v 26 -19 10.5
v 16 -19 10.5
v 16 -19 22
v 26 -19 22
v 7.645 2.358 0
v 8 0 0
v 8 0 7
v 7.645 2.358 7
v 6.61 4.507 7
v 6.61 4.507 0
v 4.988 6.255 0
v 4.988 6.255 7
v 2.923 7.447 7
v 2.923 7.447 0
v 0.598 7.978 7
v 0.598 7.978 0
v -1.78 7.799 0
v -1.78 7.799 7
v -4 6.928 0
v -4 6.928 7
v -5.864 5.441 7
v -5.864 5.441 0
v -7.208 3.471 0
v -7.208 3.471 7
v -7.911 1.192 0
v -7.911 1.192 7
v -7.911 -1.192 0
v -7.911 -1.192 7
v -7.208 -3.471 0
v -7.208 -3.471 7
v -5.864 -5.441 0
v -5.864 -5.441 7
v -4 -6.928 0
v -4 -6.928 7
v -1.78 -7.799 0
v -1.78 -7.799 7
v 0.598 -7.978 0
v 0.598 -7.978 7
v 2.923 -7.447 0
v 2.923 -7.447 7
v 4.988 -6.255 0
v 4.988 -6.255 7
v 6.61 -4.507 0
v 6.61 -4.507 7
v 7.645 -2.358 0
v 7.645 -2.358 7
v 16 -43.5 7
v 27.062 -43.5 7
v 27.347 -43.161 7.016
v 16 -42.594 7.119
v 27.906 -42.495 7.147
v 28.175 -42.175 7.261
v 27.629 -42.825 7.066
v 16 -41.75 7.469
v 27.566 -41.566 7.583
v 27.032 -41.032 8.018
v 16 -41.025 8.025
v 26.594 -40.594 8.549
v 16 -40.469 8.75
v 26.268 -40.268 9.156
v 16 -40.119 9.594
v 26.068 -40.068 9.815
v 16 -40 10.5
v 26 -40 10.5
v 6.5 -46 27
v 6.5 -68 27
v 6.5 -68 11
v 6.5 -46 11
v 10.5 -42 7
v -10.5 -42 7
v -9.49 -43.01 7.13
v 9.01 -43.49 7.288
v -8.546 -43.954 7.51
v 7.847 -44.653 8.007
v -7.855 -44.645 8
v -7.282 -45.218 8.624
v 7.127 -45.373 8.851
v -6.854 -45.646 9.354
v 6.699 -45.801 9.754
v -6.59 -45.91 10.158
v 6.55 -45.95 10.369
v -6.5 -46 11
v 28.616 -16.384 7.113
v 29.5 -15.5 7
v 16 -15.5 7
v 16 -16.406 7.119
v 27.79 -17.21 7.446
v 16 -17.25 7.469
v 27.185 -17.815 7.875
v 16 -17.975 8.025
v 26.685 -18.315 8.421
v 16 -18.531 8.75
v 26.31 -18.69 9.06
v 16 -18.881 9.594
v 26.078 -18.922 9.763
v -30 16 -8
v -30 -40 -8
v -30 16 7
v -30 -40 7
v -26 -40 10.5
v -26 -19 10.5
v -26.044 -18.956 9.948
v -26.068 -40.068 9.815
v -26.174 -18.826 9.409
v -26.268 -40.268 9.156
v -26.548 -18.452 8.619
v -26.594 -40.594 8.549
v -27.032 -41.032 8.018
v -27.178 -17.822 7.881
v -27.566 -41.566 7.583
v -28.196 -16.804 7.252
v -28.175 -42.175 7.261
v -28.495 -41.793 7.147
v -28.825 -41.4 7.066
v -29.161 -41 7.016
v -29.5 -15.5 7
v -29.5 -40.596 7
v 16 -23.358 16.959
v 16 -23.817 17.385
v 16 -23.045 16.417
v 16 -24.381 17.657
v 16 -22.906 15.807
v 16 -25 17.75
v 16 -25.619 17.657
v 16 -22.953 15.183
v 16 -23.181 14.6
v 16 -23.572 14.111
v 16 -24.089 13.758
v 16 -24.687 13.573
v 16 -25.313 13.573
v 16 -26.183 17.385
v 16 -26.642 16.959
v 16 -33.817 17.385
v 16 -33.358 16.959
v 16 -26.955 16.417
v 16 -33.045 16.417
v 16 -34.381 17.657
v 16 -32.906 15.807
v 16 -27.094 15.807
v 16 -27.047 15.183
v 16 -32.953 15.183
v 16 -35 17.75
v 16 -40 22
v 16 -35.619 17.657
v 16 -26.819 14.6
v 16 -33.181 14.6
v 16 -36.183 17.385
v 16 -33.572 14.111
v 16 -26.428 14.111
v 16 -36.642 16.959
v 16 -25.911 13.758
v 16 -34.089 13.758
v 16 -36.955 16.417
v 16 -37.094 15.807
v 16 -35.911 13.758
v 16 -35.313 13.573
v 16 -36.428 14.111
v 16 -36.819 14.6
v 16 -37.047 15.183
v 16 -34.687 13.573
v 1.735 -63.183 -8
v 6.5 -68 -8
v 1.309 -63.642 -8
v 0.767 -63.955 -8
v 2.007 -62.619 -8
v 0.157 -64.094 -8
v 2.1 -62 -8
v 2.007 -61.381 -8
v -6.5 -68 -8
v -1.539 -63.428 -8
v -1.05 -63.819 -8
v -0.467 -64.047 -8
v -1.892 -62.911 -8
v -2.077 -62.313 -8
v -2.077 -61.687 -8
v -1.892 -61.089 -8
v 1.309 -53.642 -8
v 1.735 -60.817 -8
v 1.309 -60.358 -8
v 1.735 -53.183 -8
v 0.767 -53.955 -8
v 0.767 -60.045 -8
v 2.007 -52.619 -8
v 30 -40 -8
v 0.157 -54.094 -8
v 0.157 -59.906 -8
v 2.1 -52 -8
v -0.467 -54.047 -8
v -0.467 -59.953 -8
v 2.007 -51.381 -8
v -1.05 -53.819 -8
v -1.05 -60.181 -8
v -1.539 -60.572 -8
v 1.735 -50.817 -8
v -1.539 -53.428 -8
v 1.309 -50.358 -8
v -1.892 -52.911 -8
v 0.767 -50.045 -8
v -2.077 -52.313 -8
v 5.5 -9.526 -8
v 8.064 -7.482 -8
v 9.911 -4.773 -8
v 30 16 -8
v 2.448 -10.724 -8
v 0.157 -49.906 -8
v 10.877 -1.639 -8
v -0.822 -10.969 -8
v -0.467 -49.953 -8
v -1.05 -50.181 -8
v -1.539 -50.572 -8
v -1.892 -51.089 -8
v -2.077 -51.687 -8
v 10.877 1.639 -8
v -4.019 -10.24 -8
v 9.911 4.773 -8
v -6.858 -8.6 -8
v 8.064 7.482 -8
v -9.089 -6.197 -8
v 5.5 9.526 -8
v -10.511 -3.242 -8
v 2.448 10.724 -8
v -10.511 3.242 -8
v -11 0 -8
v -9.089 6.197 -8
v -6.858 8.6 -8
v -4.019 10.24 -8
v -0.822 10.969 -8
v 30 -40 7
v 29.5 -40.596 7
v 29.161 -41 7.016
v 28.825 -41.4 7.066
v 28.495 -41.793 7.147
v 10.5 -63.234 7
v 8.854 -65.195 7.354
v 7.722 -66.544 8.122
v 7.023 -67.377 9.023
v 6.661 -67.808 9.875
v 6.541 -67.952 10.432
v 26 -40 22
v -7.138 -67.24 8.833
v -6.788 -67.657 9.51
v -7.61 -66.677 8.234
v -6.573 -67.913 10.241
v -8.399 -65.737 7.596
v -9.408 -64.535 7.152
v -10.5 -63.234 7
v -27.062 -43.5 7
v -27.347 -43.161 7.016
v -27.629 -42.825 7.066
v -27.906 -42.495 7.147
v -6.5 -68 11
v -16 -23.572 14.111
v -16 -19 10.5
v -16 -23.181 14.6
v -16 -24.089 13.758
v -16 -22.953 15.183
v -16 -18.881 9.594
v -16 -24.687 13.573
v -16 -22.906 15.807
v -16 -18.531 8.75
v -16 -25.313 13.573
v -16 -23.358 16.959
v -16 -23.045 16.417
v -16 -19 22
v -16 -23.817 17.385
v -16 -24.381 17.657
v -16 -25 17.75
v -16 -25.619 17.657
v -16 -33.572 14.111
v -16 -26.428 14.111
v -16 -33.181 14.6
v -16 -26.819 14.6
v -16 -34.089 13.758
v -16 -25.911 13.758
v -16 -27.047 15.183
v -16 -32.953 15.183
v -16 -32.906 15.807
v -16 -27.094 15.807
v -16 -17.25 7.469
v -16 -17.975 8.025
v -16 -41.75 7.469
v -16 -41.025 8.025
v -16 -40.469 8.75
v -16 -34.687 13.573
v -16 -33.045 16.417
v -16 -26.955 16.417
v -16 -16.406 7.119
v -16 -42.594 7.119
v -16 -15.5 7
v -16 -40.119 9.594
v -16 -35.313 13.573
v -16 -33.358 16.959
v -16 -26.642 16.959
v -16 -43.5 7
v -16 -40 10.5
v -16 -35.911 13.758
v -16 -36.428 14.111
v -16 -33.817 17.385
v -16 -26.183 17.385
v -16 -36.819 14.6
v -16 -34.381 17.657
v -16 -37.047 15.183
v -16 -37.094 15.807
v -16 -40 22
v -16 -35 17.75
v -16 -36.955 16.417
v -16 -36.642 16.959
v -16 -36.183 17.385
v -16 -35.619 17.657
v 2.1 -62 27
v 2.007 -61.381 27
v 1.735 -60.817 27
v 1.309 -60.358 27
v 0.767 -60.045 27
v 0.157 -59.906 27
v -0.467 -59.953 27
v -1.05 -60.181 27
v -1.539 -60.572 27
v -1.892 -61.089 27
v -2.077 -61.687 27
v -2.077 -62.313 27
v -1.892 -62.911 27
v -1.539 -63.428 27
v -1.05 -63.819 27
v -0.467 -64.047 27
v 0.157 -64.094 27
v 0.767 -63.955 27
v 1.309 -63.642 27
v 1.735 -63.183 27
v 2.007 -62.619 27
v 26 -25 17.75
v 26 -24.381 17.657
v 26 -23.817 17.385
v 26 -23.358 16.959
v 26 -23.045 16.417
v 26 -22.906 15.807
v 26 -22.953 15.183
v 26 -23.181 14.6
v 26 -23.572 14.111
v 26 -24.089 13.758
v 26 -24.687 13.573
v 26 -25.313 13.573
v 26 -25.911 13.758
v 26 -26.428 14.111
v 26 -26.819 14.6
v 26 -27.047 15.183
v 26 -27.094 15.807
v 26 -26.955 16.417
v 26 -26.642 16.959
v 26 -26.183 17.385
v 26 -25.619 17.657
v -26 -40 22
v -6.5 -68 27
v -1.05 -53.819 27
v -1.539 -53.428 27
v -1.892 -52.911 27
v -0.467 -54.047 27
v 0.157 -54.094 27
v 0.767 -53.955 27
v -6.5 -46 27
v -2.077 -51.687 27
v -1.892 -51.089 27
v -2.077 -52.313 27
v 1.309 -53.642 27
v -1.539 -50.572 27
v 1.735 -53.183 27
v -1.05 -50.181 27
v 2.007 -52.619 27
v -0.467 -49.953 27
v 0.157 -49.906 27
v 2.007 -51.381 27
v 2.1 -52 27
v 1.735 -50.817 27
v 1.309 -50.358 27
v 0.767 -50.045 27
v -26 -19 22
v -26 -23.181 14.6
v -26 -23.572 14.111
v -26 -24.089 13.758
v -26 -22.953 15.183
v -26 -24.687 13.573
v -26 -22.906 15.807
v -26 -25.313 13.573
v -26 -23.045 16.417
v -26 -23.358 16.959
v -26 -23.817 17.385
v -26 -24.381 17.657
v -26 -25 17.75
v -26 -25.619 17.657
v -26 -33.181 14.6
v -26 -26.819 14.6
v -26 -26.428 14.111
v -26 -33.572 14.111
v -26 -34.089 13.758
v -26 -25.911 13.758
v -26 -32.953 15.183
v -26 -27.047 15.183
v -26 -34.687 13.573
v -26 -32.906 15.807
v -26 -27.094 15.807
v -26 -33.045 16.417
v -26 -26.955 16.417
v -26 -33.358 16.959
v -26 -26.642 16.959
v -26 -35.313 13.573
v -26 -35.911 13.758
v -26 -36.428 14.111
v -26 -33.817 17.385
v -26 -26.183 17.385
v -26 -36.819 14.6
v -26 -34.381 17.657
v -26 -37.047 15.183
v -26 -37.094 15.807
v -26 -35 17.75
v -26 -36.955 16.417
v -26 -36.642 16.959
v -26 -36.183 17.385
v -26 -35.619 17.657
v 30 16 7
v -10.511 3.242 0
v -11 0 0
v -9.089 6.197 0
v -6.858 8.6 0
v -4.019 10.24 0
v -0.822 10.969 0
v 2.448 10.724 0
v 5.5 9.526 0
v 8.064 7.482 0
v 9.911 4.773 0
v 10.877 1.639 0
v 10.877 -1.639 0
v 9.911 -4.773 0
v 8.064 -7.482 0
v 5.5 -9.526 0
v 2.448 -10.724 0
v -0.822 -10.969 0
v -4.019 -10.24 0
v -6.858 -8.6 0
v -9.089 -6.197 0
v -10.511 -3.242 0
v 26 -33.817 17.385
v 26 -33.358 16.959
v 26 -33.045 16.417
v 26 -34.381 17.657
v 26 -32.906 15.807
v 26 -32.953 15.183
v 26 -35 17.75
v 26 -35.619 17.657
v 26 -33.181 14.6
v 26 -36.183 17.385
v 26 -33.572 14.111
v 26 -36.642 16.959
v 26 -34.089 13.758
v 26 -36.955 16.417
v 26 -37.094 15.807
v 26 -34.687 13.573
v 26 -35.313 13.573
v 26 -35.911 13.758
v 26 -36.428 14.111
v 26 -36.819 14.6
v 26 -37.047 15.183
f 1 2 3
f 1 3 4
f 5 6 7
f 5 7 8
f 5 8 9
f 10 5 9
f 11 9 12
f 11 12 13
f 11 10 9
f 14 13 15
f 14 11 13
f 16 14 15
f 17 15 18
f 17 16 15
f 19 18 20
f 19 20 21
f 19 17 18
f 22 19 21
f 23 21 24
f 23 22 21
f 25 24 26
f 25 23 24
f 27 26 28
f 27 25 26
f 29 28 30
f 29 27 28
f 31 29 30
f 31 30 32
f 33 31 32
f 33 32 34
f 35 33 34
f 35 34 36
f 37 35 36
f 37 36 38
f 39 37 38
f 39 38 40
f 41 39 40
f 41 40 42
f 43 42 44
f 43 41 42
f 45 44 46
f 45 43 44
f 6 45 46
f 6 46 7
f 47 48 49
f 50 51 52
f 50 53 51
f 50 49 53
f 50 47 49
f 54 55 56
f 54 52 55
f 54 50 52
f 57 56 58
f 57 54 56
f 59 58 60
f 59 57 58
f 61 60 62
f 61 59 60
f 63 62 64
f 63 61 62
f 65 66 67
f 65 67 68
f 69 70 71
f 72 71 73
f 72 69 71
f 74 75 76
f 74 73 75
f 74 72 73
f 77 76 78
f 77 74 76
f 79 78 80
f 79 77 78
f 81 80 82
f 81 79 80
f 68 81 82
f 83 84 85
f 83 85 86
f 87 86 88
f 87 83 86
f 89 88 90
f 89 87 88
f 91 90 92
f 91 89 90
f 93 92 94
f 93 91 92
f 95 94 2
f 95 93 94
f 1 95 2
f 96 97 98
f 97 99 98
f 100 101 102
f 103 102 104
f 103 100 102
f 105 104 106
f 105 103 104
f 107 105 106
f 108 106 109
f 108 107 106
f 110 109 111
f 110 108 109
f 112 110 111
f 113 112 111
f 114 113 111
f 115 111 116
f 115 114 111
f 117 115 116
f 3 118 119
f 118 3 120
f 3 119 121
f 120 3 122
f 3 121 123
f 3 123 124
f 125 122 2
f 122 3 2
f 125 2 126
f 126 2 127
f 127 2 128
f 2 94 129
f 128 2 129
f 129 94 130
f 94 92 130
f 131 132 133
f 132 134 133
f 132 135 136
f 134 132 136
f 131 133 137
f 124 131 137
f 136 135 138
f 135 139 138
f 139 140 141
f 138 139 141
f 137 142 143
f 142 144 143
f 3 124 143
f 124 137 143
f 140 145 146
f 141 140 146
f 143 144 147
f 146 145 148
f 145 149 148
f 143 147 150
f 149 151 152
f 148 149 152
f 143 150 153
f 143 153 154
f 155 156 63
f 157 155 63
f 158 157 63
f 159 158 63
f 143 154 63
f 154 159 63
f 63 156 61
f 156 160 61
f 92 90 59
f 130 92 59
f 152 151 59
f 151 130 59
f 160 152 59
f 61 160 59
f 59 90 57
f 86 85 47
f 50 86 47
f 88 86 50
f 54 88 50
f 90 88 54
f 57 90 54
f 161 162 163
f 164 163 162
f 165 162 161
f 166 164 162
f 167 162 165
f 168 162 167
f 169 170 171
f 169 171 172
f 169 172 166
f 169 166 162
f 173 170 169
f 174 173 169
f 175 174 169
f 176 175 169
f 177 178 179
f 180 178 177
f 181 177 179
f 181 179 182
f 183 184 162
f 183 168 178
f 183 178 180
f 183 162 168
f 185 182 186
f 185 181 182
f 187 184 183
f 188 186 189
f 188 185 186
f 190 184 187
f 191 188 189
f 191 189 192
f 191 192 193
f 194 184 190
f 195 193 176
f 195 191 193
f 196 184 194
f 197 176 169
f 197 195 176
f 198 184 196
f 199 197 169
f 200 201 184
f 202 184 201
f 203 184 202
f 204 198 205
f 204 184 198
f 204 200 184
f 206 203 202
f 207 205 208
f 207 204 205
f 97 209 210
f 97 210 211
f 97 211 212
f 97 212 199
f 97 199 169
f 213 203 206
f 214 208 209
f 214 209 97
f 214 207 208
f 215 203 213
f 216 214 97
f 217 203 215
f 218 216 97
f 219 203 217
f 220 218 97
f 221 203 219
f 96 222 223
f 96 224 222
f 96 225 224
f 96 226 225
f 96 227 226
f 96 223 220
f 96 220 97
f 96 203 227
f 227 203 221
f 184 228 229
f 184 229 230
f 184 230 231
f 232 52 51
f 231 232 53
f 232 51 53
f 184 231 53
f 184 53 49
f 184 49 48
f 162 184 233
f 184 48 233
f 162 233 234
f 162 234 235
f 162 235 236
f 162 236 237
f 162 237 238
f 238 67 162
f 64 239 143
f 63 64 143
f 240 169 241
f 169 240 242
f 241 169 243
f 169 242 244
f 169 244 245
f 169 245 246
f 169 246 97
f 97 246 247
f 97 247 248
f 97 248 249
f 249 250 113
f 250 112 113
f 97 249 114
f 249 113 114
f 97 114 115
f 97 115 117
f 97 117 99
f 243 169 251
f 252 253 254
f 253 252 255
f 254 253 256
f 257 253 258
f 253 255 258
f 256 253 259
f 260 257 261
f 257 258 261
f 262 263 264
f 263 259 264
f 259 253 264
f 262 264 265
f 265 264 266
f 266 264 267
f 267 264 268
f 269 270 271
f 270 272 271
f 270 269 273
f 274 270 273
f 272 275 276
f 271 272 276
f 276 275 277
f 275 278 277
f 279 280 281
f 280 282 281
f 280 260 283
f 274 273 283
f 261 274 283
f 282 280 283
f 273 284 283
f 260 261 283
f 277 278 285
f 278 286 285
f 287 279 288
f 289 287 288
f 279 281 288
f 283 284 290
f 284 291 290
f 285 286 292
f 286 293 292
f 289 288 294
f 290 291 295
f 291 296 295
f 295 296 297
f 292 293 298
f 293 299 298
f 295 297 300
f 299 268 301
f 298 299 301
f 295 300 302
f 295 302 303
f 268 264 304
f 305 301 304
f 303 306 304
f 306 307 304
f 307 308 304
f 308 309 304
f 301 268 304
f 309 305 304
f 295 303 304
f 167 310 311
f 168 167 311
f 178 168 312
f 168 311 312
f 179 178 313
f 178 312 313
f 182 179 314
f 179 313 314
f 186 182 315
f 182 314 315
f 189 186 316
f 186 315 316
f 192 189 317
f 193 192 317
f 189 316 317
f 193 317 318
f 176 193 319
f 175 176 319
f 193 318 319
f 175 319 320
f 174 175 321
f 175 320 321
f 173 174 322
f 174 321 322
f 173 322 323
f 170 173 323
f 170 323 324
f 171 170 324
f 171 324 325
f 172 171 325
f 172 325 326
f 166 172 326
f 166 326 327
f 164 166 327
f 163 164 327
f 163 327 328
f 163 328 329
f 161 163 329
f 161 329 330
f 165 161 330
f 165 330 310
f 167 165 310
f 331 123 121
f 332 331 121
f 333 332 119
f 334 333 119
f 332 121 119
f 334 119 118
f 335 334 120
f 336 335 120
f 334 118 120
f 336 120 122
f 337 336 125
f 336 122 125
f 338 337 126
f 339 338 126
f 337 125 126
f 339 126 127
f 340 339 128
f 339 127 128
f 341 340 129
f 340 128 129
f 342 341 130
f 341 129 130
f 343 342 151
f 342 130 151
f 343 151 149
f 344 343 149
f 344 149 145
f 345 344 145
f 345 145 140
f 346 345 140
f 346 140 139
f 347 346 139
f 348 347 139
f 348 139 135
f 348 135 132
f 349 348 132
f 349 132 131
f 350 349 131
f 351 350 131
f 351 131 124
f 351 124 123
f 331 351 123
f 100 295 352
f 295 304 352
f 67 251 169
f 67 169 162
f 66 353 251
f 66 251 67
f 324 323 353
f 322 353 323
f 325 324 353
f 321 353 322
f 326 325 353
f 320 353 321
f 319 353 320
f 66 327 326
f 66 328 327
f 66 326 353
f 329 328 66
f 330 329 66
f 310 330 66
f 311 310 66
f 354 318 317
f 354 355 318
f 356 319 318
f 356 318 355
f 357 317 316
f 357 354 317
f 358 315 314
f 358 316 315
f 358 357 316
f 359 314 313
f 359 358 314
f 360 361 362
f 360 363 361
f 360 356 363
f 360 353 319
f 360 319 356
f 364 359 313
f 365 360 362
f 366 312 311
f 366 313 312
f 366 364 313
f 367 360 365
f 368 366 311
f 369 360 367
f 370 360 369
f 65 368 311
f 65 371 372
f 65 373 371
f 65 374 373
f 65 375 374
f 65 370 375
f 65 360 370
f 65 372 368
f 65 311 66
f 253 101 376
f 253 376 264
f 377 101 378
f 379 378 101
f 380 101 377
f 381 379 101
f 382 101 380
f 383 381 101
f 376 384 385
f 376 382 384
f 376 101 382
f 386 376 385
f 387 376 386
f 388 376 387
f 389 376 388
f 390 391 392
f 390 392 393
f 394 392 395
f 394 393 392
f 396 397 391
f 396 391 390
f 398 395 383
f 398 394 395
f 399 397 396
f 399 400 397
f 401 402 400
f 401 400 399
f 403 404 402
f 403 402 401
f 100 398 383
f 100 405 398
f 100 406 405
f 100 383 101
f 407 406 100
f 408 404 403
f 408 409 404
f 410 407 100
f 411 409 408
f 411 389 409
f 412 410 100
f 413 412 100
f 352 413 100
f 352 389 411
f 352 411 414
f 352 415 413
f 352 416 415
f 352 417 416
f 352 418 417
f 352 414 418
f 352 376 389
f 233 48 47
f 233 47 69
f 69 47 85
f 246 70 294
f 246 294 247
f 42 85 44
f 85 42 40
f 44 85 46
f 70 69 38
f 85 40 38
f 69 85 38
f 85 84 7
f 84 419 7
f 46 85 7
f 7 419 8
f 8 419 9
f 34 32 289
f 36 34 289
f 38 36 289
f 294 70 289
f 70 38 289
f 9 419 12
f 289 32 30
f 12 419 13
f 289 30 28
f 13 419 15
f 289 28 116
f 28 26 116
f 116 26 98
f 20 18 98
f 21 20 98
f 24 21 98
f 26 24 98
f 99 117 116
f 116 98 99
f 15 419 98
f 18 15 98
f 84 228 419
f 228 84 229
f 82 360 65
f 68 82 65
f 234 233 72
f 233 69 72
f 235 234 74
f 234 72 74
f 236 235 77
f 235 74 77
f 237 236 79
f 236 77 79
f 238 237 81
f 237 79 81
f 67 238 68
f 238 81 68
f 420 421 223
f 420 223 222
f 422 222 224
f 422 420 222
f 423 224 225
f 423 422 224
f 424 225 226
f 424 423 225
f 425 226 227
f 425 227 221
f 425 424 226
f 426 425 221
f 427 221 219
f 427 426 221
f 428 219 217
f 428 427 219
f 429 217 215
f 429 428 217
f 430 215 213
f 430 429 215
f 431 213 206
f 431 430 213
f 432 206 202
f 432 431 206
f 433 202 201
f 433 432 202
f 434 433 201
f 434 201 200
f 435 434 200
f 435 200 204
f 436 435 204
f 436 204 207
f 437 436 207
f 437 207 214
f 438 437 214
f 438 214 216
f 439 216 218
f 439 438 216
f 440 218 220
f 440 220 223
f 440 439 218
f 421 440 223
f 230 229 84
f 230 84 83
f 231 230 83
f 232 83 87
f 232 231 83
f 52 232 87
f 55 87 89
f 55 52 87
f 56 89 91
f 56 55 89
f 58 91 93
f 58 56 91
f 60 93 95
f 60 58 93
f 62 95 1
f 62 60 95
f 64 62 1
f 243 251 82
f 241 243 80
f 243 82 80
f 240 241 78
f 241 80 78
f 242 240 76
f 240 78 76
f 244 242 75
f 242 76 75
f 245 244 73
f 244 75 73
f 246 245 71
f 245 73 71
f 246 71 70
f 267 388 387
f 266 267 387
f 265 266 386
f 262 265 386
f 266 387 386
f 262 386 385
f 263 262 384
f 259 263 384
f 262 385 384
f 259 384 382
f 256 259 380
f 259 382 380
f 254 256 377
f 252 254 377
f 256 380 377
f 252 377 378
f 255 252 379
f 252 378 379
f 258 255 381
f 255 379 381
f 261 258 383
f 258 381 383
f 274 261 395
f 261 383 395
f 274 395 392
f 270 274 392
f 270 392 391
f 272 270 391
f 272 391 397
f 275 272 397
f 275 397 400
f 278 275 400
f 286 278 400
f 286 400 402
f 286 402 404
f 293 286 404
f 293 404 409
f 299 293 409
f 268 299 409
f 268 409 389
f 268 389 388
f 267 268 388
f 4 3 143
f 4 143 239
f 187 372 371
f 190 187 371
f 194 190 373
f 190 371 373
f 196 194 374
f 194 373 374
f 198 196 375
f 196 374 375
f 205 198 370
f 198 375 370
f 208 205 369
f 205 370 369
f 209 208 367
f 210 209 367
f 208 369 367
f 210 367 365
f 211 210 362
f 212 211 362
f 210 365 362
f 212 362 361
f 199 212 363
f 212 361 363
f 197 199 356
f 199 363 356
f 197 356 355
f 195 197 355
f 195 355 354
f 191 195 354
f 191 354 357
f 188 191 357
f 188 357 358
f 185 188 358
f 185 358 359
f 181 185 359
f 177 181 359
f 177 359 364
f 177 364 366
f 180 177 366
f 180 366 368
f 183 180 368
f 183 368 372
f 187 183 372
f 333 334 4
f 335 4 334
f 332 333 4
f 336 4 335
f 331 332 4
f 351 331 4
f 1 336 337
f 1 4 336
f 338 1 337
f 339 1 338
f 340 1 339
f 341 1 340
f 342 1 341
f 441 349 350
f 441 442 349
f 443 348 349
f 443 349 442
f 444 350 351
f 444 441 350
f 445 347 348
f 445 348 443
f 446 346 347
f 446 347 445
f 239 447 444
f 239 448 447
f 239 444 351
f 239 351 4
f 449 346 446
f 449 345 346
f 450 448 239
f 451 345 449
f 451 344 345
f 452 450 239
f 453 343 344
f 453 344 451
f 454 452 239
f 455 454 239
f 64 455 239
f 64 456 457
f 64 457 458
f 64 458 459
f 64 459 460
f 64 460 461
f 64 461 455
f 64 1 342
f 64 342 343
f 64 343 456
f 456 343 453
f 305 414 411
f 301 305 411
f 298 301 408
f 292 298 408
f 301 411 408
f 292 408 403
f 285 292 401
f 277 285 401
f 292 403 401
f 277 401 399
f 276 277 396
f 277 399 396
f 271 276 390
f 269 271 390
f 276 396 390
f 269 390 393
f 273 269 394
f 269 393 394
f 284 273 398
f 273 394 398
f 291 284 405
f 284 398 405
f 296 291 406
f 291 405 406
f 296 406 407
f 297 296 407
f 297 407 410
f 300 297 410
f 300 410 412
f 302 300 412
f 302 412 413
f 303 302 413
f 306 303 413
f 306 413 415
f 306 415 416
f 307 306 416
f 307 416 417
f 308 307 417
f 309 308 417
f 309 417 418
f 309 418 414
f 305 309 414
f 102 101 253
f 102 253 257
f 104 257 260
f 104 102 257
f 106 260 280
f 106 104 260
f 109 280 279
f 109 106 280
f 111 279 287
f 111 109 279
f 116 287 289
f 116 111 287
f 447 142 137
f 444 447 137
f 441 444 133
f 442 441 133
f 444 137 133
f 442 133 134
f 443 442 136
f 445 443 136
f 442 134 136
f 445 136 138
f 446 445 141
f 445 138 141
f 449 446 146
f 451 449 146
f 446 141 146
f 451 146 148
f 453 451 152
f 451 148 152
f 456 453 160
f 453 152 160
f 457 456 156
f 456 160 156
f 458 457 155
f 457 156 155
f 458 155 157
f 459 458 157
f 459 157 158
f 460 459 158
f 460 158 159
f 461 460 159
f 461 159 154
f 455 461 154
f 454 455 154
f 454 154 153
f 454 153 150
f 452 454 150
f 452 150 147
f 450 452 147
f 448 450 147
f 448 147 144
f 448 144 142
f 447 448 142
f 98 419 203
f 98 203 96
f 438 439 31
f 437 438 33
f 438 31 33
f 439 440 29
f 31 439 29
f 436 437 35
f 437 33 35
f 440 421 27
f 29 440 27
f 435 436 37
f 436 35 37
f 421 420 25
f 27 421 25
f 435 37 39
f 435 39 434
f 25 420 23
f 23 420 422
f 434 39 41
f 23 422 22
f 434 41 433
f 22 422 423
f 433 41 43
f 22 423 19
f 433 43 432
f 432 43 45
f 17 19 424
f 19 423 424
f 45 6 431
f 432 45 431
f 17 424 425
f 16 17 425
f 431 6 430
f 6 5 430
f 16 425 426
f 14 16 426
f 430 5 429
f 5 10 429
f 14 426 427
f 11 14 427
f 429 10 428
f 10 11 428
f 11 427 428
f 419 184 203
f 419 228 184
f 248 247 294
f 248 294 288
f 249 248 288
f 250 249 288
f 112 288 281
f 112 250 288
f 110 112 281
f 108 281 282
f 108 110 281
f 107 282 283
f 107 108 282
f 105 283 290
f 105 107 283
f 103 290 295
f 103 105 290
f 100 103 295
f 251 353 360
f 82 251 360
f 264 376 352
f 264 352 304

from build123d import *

# Parameters (mm, degrees)
SKETCH1_W           = 60
SKETCH1_H           = 56
SKETCH1_R           = 8
BOSS_EXTRUDE1_DEPTH = 7
SKETCH2_W           = 60
SKETCH2_H           = 56
SKETCH2_R           = 11
BOSS_EXTRUDE2_DEPTH = 8
SKETCH3_W           = 10
SKETCH3_H           = 21
BOSS_EXTRUDE3_DEPTH = 15
SKETCH4_R           = 2.1
CUT_EXTRUDE1_DEPTH  = 73.249567473
SKETCH5_R           = 2.1
BOSS_EXTRUDE4_DEPTH = 15
FILLET2_R           = 3.5
BOSS_EXTRUDE5_START = 20
SKETCH7_W           = 13
SKETCH7_H           = 22
SKETCH7_R           = 2.1
BOSS_EXTRUDE5_DEPTH = 20
FILLET3_R           = 4


with BuildPart() as part:
    # Sketch1 → Boss-Extrude1 (new body)
    with BuildSketch(Plane.XY):
        with Locations((0, -12)):
            Rectangle(SKETCH1_W, SKETCH1_H)
        Circle(SKETCH1_R, mode=Mode.SUBTRACT)
    extrude(amount=BOSS_EXTRUDE1_DEPTH)

    # Sketch2 → Boss-Extrude2 (add)
    with BuildSketch(Plane(origin=(0, 0, 0), x_dir=(-1, 0, 0), z_dir=(0, 0, -1))):
        with Locations((0, -12)):
            Rectangle(SKETCH2_W, SKETCH2_H)
        Circle(SKETCH2_R, mode=Mode.SUBTRACT)
    extrude(amount=BOSS_EXTRUDE2_DEPTH)

    # Sketch3 → Boss-Extrude3 (add)
    with BuildSketch(Plane.XY.offset(7)):
        with Locations((-21, -29.5)):
            Rectangle(SKETCH3_W, SKETCH3_H)
        with Locations((21, -29.5)):
            Rectangle(SKETCH3_W, SKETCH3_H)
    extrude(amount=BOSS_EXTRUDE3_DEPTH)

    # Sketch4 → Cut-Extrude1 (cut, through all)
    with BuildSketch(Plane.ZY.offset(26)):
        with Locations((15.65, -25)):
            Circle(SKETCH4_R)
        with Locations((15.65, -35)):
            Circle(SKETCH4_R)
    extrude(amount=-CUT_EXTRUDE1_DEPTH, mode=Mode.SUBTRACT)

    # Sketch5 → Boss-Extrude4 (add, through all)
    with BuildSketch(Plane.XY.offset(7)):
        Polygon((-30, -40), (30, -40), (6.5, -68), (-6.5, -68), align=None)
        with Locations((0, -52)):
            Circle(SKETCH5_R, mode=Mode.SUBTRACT)
        with Locations((0, -62)):
            Circle(SKETCH5_R, mode=Mode.SUBTRACT)
    extrude(amount=-BOSS_EXTRUDE4_DEPTH)

    # Fillet2
    # the kernel refuses this fillet: 3.5 mm, written as the material it adds along each edge
    with BuildSketch(Plane(origin=(-26, -19, 7), x_dir=(0, 1, 0), z_dir=(1, 0, 0)), Plane(origin=(-26, -40, 7), x_dir=(0, 0, 1), z_dir=(1, 0, 0))) as fillet2_piece_1:
        with BuildLine():
            CenterArc((FILLET2_R, FILLET2_R), FILLET2_R, 180, 90)
            Line((0, FILLET2_R), (0, 0))
            Line((0, 0), (FILLET2_R, 0))
        make_face()
    extrude(amount=10)
    with BuildSketch(Plane(origin=(-26, -40, 7), x_dir=(-1, 0, 0), z_dir=(0, 1, 0))) as fillet2_piece_2:
        with BuildLine():
            CenterArc((FILLET2_R, FILLET2_R), FILLET2_R, 180, 90)
            Line((0, FILLET2_R), (0, 0))
            Line((0, 0), (FILLET2_R, 0))
        make_face()
    extrude(amount=21)
    with BuildSketch(Plane(origin=(26, -19, 7), x_dir=(0, 1, 0), z_dir=(-1, 0, 0)), Plane(origin=(16, -40, 7), x_dir=(0, -1, 0), z_dir=(1, 0, 0))) as fillet2_piece_3:
        with BuildLine():
            CenterArc((FILLET2_R, -FILLET2_R), FILLET2_R, 90, 90)
            Line((0, -FILLET2_R), (0, 0))
            Line((0, 0), (FILLET2_R, 0))
        make_face()
    extrude(amount=10)
    with BuildSketch(Plane(origin=(26, -40, 7), x_dir=(1, 0, 0), z_dir=(0, 1, 0))) as fillet2_piece_4:
        with BuildLine():
            CenterArc((FILLET2_R, -FILLET2_R), FILLET2_R, 90, 90)
            Line((0, -FILLET2_R), (0, 0))
            Line((0, 0), (FILLET2_R, 0))
        make_face()
    extrude(amount=21)
    with BuildSketch(Plane(origin=(-34.75, -19, 7), x_dir=(0, 1, 0), z_dir=(1, 0, 0))) as fillet2_piece_5a_section:
        with BuildLine():
            CenterArc((FILLET2_R, FILLET2_R), FILLET2_R, 180, 90)
            Line((0, FILLET2_R), (0, 0))
            Line((0, 0), (FILLET2_R, 0))
        make_face()
    fillet2_piece_5a = extrude(amount=18.75, mode=Mode.PRIVATE)
    fillet2_piece_5a = split(fillet2_piece_5a, bisect_by=Plane(origin=(-30, -18.2076171, 7.7923829), z_dir=(1, 0, 0)), keep=Keep.TOP, mode=Mode.PRIVATE)
    fillet2_piece_5a = split(fillet2_piece_5a, bisect_by=Plane(origin=(-26, -18.2076171, 7.7923829), z_dir=(-1, 0, 0)), keep=Keep.TOP, mode=Mode.PRIVATE)
    with BuildSketch(Plane(origin=(-26, -40, 7), x_dir=(-1, 0, 0), z_dir=(0, 1, 0))) as fillet2_piece_5b_section:
        with BuildLine():
            CenterArc((FILLET2_R, FILLET2_R), FILLET2_R, 180, 90)
            Line((0, FILLET2_R), (0, 0))
            Line((0, 0), (FILLET2_R, 0))
        make_face()
    fillet2_piece_5b = extrude(amount=29.75, mode=Mode.PRIVATE)
    fillet2_piece_5b = split(fillet2_piece_5b, bisect_by=Plane(origin=(-26.7923829, -19, 7.7923829), z_dir=(0, 1, 0)), keep=Keep.TOP, mode=Mode.PRIVATE)
    fillet2_piece_5 = fillet2_piece_5a & fillet2_piece_5b
    add(fillet2_piece_5)
    with BuildSketch(Plane(origin=(-34.75, -40, 7), x_dir=(0, 0, 1), z_dir=(1, 0, 0))) as fillet2_piece_6a_section:
        with BuildLine():
            CenterArc((FILLET2_R, FILLET2_R), FILLET2_R, 180, 90)
            Line((0, FILLET2_R), (0, 0))
            Line((0, 0), (FILLET2_R, 0))
        make_face()
    fillet2_piece_6a = extrude(amount=18.75, mode=Mode.PRIVATE)
    fillet2_piece_6a = split(fillet2_piece_6a, bisect_by=Plane(origin=(-26, -40.649592252, 7.87643738), z_dir=(-1, 0, 0)), keep=Keep.TOP, mode=Mode.PRIVATE)
    fillet2_piece_6a = split(fillet2_piece_6a, bisect_by=Plane(origin=(-28.740316489, -41.500899502, 7.87643738), z_dir=(0.765974253829985, 0.6428712487501661, 0)), keep=Keep.TOP, mode=Mode.PRIVATE)
    fillet2_piece_6a = split(fillet2_piece_6a, bisect_by=Plane(origin=(-30, -40.649592252, 7.87643738), z_dir=(1, 0, 0)), keep=Keep.TOP, mode=Mode.PRIVATE)
    with BuildSketch(Plane(origin=(-26, -48.75, 7), x_dir=(-1, 0, 0), z_dir=(0, 1, 0))) as fillet2_piece_6b_section:
        with BuildLine():
            CenterArc((FILLET2_R, FILLET2_R), FILLET2_R, 180, 90)
            Line((0, FILLET2_R), (0, 0))
            Line((0, 0), (FILLET2_R, 0))
        make_face()
    fillet2_piece_6b = extrude(amount=29.75, mode=Mode.PRIVATE)
    fillet2_piece_6b = split(fillet2_piece_6b, bisect_by=Plane(origin=(-26.614887028, -40, 7.897241021), z_dir=(0, -1, 0)), keep=Keep.TOP, mode=Mode.PRIVATE)
    fillet2_piece_6b = split(fillet2_piece_6b, bisect_by=Plane(origin=(-27.607937943, -42.850116494, 7.897241021), z_dir=(0.765974253829985, 0.6428712487501661, 0)), keep=Keep.TOP, mode=Mode.PRIVATE)
    fillet2_piece_6 = fillet2_piece_6a & fillet2_piece_6b
    add(fillet2_piece_6)
    with BuildSketch(Plane(origin=(26, -40, 7), x_dir=(1, 0, 0), z_dir=(0, 1, 0))) as fillet2_piece_7a_section:
        with BuildLine():
            CenterArc((FILLET2_R, -FILLET2_R), FILLET2_R, 90, 90)
            Line((0, -FILLET2_R), (0, 0))
            Line((0, 0), (FILLET2_R, 0))
        make_face()
    fillet2_piece_7a = extrude(amount=29.75, mode=Mode.PRIVATE)
    fillet2_piece_7a = split(fillet2_piece_7a, bisect_by=Plane(origin=(26.7923829, -19, 7.7923829), z_dir=(0, 1, 0)), keep=Keep.TOP, mode=Mode.PRIVATE)
    with BuildSketch(Plane(origin=(34.75, -19, 7), x_dir=(0, 1, 0), z_dir=(-1, 0, 0))) as fillet2_piece_7b_section:
        with BuildLine():
            CenterArc((FILLET2_R, -FILLET2_R), FILLET2_R, 90, 90)
            Line((0, -FILLET2_R), (0, 0))
            Line((0, 0), (FILLET2_R, 0))
        make_face()
    fillet2_piece_7b = extrude(amount=18.75, mode=Mode.PRIVATE)
    fillet2_piece_7b = split(fillet2_piece_7b, bisect_by=Plane(origin=(30, -18.2076171, 7.7923829), z_dir=(-1, 0, 0)), keep=Keep.TOP, mode=Mode.PRIVATE)
    fillet2_piece_7b = split(fillet2_piece_7b, bisect_by=Plane(origin=(26, -18.2076171, 7.7923829), z_dir=(1, 0, 0)), keep=Keep.TOP, mode=Mode.PRIVATE)
    fillet2_piece_7 = fillet2_piece_7a & fillet2_piece_7b
    add(fillet2_piece_7)
    with BuildSketch(Plane(origin=(16, -40, 7), x_dir=(0, -1, 0), z_dir=(1, 0, 0))) as fillet2_piece_8a_section:
        with BuildLine():
            CenterArc((FILLET2_R, -FILLET2_R), FILLET2_R, 90, 90)
            Line((0, -FILLET2_R), (0, 0))
            Line((0, 0), (FILLET2_R, 0))
        make_face()
    fillet2_piece_8a = extrude(amount=18.75, mode=Mode.PRIVATE)
    fillet2_piece_8a = split(fillet2_piece_8a, bisect_by=Plane(origin=(28.740316489, -41.500899502, 7.87643738), z_dir=(-0.7659742538299851, 0.6428712487501659, 0)), keep=Keep.TOP, mode=Mode.PRIVATE)
    fillet2_piece_8a = split(fillet2_piece_8a, bisect_by=Plane(origin=(30, -40.649592252, 7.87643738), z_dir=(-1, 0, 0)), keep=Keep.TOP, mode=Mode.PRIVATE)
    fillet2_piece_8a = split(fillet2_piece_8a, bisect_by=Plane(origin=(26, -40.649592252, 7.87643738), z_dir=(1, 0, 0)), keep=Keep.TOP, mode=Mode.PRIVATE)
    with BuildSketch(Plane(origin=(26, -48.75, 7), x_dir=(1, 0, 0), z_dir=(0, 1, 0))) as fillet2_piece_8b_section:
        with BuildLine():
            CenterArc((FILLET2_R, -FILLET2_R), FILLET2_R, 90, 90)
            Line((0, -FILLET2_R), (0, 0))
            Line((0, 0), (FILLET2_R, 0))
        make_face()
    fillet2_piece_8b = extrude(amount=29.75, mode=Mode.PRIVATE)
    fillet2_piece_8b = split(fillet2_piece_8b, bisect_by=Plane(origin=(27.607937943, -42.850116494, 7.897241021), z_dir=(-0.7659742538299851, 0.6428712487501659, 0)), keep=Keep.TOP, mode=Mode.PRIVATE)
    fillet2_piece_8b = split(fillet2_piece_8b, bisect_by=Plane(origin=(26.614887028, -40, 7.897241021), z_dir=(0, -1, 0)), keep=Keep.TOP, mode=Mode.PRIVATE)
    fillet2_piece_8 = fillet2_piece_8a & fillet2_piece_8b
    add(fillet2_piece_8)

    # Sketch7 → Boss-Extrude5 (add)
    with BuildSketch(Plane.XY.offset(7).offset(BOSS_EXTRUDE5_START)):
        with Locations((0, -57)):
            Rectangle(SKETCH7_W, SKETCH7_H)
        with Locations((0, -62)):
            Circle(SKETCH7_R, mode=Mode.SUBTRACT)
        with Locations((0, -52)):
            Circle(SKETCH7_R, mode=Mode.SUBTRACT)
    extrude(amount=-BOSS_EXTRUDE5_DEPTH)

    # Fillet3
    fillet3_edges = [part.edges().sort_by_distance(p)[0] for p in [
        (-6.5, -57, 7),
        (6.5, -57, 7),
        (0, -46, 7),
    ]]
    fillet(fillet3_edges, radius=FILLET3_R)


solid = part.part
